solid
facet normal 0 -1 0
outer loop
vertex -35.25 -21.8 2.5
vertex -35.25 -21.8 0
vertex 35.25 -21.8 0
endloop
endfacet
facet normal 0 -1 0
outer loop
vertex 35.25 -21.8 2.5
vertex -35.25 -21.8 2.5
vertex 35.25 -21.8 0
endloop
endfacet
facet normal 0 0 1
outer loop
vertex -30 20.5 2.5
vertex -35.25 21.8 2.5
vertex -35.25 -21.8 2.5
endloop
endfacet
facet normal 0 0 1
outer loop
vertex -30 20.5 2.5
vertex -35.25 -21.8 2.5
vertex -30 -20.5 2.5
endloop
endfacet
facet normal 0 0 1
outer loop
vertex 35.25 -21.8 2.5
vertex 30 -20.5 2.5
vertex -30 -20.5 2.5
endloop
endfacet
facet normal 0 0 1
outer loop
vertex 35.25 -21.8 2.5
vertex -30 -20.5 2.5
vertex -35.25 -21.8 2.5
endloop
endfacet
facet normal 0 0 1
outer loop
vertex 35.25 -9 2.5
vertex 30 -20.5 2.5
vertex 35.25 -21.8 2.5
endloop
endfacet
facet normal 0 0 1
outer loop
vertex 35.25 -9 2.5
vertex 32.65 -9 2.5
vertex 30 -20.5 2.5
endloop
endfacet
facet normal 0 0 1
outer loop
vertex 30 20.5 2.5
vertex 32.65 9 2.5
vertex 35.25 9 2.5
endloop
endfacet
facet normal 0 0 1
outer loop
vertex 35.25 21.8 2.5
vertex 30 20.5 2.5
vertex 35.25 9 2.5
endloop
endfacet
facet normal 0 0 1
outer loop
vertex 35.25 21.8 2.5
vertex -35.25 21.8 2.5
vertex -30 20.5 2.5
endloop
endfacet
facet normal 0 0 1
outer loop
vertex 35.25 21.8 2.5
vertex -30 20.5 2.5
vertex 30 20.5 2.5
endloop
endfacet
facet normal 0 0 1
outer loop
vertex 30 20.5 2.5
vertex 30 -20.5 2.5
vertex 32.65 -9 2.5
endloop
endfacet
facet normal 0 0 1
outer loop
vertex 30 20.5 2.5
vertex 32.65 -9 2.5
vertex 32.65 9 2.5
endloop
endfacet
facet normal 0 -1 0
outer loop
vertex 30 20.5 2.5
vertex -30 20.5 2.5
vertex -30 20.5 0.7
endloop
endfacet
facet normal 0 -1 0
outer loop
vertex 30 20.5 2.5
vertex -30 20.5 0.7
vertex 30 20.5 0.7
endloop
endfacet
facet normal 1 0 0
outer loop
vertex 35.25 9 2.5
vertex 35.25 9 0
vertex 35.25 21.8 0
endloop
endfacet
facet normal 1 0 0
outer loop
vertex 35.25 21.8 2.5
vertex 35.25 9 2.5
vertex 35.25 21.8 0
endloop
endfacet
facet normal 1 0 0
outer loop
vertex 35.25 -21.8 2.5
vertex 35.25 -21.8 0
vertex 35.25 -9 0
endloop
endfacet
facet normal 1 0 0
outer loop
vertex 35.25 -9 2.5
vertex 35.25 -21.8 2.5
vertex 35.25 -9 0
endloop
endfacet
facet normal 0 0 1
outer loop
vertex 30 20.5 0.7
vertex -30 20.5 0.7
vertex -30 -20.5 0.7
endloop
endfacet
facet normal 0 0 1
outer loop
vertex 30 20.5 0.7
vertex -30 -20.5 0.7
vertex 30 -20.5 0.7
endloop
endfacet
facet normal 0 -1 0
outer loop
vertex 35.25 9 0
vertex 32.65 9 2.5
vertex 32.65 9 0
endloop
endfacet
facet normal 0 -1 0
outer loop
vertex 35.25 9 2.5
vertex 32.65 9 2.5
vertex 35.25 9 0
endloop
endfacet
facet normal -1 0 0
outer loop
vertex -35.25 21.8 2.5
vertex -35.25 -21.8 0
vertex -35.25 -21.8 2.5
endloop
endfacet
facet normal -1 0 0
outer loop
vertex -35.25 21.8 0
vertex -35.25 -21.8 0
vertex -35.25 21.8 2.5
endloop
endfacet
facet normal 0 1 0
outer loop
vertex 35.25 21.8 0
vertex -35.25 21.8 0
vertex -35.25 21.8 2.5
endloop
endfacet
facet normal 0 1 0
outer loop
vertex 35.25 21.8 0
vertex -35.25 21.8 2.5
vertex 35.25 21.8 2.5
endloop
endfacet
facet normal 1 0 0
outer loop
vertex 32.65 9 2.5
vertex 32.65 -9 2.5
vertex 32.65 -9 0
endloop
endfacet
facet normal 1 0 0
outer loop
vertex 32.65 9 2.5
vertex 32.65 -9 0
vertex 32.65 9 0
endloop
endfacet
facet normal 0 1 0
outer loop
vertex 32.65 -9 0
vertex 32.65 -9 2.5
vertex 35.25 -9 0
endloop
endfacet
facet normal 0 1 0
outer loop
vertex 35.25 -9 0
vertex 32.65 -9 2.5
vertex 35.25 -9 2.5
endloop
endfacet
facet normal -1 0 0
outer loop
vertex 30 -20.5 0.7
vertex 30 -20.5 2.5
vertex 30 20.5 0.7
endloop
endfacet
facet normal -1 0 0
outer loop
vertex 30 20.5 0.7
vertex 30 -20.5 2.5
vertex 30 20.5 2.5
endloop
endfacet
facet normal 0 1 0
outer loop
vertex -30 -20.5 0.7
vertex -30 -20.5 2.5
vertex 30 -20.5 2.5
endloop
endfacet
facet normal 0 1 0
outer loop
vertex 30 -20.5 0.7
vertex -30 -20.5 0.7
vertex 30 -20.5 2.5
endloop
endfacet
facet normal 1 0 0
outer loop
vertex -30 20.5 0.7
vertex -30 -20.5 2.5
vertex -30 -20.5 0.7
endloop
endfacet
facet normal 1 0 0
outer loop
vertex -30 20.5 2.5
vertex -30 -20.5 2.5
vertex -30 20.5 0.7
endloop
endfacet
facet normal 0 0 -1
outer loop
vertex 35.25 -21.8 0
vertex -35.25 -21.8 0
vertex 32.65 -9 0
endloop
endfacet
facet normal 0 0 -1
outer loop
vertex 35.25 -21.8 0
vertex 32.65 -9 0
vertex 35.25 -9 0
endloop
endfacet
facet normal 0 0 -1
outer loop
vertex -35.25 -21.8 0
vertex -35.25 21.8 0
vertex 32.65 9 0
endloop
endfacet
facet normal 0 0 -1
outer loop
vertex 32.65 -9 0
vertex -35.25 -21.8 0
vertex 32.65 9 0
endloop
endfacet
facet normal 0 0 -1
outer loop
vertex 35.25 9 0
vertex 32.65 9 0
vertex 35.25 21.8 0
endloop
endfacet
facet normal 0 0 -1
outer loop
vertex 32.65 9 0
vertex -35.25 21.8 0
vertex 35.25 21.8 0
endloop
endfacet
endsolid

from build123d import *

# Parameters (mm, degrees)
SKETCH_W        = 70.5
SKETCH_H        = 43.6
PAD_DEPTH       = 2.5
SKETCH001_W     = 60
SKETCH001_H     = 41
POCKET_DEPTH    = 1.8
SKETCH002_W     = 2.6
SKETCH002_H     = 18
POCKET001_DEPTH = 5


with BuildPart() as part:
    # Sketch → Pad (new body)
    with BuildSketch(Plane.XY):
        Rectangle(SKETCH_W, SKETCH_H)
    extrude(amount=PAD_DEPTH)

    # Sketch001 (on Face6 of Pad) → Pocket (cut)
    with BuildSketch(Plane.XY.offset(2.5)):
        Rectangle(SKETCH001_W, SKETCH001_H)
    extrude(amount=-POCKET_DEPTH, mode=Mode.SUBTRACT)

    # Sketch002 (on Face5 of Pocket) → Pocket001 (cut)
    with BuildSketch(Plane.XY.offset(2.5)):
        with Locations((33.95, 0)):
            Rectangle(SKETCH002_W, SKETCH002_H)
    extrude(amount=-POCKET001_DEPTH, mode=Mode.SUBTRACT)


solid = part.part
